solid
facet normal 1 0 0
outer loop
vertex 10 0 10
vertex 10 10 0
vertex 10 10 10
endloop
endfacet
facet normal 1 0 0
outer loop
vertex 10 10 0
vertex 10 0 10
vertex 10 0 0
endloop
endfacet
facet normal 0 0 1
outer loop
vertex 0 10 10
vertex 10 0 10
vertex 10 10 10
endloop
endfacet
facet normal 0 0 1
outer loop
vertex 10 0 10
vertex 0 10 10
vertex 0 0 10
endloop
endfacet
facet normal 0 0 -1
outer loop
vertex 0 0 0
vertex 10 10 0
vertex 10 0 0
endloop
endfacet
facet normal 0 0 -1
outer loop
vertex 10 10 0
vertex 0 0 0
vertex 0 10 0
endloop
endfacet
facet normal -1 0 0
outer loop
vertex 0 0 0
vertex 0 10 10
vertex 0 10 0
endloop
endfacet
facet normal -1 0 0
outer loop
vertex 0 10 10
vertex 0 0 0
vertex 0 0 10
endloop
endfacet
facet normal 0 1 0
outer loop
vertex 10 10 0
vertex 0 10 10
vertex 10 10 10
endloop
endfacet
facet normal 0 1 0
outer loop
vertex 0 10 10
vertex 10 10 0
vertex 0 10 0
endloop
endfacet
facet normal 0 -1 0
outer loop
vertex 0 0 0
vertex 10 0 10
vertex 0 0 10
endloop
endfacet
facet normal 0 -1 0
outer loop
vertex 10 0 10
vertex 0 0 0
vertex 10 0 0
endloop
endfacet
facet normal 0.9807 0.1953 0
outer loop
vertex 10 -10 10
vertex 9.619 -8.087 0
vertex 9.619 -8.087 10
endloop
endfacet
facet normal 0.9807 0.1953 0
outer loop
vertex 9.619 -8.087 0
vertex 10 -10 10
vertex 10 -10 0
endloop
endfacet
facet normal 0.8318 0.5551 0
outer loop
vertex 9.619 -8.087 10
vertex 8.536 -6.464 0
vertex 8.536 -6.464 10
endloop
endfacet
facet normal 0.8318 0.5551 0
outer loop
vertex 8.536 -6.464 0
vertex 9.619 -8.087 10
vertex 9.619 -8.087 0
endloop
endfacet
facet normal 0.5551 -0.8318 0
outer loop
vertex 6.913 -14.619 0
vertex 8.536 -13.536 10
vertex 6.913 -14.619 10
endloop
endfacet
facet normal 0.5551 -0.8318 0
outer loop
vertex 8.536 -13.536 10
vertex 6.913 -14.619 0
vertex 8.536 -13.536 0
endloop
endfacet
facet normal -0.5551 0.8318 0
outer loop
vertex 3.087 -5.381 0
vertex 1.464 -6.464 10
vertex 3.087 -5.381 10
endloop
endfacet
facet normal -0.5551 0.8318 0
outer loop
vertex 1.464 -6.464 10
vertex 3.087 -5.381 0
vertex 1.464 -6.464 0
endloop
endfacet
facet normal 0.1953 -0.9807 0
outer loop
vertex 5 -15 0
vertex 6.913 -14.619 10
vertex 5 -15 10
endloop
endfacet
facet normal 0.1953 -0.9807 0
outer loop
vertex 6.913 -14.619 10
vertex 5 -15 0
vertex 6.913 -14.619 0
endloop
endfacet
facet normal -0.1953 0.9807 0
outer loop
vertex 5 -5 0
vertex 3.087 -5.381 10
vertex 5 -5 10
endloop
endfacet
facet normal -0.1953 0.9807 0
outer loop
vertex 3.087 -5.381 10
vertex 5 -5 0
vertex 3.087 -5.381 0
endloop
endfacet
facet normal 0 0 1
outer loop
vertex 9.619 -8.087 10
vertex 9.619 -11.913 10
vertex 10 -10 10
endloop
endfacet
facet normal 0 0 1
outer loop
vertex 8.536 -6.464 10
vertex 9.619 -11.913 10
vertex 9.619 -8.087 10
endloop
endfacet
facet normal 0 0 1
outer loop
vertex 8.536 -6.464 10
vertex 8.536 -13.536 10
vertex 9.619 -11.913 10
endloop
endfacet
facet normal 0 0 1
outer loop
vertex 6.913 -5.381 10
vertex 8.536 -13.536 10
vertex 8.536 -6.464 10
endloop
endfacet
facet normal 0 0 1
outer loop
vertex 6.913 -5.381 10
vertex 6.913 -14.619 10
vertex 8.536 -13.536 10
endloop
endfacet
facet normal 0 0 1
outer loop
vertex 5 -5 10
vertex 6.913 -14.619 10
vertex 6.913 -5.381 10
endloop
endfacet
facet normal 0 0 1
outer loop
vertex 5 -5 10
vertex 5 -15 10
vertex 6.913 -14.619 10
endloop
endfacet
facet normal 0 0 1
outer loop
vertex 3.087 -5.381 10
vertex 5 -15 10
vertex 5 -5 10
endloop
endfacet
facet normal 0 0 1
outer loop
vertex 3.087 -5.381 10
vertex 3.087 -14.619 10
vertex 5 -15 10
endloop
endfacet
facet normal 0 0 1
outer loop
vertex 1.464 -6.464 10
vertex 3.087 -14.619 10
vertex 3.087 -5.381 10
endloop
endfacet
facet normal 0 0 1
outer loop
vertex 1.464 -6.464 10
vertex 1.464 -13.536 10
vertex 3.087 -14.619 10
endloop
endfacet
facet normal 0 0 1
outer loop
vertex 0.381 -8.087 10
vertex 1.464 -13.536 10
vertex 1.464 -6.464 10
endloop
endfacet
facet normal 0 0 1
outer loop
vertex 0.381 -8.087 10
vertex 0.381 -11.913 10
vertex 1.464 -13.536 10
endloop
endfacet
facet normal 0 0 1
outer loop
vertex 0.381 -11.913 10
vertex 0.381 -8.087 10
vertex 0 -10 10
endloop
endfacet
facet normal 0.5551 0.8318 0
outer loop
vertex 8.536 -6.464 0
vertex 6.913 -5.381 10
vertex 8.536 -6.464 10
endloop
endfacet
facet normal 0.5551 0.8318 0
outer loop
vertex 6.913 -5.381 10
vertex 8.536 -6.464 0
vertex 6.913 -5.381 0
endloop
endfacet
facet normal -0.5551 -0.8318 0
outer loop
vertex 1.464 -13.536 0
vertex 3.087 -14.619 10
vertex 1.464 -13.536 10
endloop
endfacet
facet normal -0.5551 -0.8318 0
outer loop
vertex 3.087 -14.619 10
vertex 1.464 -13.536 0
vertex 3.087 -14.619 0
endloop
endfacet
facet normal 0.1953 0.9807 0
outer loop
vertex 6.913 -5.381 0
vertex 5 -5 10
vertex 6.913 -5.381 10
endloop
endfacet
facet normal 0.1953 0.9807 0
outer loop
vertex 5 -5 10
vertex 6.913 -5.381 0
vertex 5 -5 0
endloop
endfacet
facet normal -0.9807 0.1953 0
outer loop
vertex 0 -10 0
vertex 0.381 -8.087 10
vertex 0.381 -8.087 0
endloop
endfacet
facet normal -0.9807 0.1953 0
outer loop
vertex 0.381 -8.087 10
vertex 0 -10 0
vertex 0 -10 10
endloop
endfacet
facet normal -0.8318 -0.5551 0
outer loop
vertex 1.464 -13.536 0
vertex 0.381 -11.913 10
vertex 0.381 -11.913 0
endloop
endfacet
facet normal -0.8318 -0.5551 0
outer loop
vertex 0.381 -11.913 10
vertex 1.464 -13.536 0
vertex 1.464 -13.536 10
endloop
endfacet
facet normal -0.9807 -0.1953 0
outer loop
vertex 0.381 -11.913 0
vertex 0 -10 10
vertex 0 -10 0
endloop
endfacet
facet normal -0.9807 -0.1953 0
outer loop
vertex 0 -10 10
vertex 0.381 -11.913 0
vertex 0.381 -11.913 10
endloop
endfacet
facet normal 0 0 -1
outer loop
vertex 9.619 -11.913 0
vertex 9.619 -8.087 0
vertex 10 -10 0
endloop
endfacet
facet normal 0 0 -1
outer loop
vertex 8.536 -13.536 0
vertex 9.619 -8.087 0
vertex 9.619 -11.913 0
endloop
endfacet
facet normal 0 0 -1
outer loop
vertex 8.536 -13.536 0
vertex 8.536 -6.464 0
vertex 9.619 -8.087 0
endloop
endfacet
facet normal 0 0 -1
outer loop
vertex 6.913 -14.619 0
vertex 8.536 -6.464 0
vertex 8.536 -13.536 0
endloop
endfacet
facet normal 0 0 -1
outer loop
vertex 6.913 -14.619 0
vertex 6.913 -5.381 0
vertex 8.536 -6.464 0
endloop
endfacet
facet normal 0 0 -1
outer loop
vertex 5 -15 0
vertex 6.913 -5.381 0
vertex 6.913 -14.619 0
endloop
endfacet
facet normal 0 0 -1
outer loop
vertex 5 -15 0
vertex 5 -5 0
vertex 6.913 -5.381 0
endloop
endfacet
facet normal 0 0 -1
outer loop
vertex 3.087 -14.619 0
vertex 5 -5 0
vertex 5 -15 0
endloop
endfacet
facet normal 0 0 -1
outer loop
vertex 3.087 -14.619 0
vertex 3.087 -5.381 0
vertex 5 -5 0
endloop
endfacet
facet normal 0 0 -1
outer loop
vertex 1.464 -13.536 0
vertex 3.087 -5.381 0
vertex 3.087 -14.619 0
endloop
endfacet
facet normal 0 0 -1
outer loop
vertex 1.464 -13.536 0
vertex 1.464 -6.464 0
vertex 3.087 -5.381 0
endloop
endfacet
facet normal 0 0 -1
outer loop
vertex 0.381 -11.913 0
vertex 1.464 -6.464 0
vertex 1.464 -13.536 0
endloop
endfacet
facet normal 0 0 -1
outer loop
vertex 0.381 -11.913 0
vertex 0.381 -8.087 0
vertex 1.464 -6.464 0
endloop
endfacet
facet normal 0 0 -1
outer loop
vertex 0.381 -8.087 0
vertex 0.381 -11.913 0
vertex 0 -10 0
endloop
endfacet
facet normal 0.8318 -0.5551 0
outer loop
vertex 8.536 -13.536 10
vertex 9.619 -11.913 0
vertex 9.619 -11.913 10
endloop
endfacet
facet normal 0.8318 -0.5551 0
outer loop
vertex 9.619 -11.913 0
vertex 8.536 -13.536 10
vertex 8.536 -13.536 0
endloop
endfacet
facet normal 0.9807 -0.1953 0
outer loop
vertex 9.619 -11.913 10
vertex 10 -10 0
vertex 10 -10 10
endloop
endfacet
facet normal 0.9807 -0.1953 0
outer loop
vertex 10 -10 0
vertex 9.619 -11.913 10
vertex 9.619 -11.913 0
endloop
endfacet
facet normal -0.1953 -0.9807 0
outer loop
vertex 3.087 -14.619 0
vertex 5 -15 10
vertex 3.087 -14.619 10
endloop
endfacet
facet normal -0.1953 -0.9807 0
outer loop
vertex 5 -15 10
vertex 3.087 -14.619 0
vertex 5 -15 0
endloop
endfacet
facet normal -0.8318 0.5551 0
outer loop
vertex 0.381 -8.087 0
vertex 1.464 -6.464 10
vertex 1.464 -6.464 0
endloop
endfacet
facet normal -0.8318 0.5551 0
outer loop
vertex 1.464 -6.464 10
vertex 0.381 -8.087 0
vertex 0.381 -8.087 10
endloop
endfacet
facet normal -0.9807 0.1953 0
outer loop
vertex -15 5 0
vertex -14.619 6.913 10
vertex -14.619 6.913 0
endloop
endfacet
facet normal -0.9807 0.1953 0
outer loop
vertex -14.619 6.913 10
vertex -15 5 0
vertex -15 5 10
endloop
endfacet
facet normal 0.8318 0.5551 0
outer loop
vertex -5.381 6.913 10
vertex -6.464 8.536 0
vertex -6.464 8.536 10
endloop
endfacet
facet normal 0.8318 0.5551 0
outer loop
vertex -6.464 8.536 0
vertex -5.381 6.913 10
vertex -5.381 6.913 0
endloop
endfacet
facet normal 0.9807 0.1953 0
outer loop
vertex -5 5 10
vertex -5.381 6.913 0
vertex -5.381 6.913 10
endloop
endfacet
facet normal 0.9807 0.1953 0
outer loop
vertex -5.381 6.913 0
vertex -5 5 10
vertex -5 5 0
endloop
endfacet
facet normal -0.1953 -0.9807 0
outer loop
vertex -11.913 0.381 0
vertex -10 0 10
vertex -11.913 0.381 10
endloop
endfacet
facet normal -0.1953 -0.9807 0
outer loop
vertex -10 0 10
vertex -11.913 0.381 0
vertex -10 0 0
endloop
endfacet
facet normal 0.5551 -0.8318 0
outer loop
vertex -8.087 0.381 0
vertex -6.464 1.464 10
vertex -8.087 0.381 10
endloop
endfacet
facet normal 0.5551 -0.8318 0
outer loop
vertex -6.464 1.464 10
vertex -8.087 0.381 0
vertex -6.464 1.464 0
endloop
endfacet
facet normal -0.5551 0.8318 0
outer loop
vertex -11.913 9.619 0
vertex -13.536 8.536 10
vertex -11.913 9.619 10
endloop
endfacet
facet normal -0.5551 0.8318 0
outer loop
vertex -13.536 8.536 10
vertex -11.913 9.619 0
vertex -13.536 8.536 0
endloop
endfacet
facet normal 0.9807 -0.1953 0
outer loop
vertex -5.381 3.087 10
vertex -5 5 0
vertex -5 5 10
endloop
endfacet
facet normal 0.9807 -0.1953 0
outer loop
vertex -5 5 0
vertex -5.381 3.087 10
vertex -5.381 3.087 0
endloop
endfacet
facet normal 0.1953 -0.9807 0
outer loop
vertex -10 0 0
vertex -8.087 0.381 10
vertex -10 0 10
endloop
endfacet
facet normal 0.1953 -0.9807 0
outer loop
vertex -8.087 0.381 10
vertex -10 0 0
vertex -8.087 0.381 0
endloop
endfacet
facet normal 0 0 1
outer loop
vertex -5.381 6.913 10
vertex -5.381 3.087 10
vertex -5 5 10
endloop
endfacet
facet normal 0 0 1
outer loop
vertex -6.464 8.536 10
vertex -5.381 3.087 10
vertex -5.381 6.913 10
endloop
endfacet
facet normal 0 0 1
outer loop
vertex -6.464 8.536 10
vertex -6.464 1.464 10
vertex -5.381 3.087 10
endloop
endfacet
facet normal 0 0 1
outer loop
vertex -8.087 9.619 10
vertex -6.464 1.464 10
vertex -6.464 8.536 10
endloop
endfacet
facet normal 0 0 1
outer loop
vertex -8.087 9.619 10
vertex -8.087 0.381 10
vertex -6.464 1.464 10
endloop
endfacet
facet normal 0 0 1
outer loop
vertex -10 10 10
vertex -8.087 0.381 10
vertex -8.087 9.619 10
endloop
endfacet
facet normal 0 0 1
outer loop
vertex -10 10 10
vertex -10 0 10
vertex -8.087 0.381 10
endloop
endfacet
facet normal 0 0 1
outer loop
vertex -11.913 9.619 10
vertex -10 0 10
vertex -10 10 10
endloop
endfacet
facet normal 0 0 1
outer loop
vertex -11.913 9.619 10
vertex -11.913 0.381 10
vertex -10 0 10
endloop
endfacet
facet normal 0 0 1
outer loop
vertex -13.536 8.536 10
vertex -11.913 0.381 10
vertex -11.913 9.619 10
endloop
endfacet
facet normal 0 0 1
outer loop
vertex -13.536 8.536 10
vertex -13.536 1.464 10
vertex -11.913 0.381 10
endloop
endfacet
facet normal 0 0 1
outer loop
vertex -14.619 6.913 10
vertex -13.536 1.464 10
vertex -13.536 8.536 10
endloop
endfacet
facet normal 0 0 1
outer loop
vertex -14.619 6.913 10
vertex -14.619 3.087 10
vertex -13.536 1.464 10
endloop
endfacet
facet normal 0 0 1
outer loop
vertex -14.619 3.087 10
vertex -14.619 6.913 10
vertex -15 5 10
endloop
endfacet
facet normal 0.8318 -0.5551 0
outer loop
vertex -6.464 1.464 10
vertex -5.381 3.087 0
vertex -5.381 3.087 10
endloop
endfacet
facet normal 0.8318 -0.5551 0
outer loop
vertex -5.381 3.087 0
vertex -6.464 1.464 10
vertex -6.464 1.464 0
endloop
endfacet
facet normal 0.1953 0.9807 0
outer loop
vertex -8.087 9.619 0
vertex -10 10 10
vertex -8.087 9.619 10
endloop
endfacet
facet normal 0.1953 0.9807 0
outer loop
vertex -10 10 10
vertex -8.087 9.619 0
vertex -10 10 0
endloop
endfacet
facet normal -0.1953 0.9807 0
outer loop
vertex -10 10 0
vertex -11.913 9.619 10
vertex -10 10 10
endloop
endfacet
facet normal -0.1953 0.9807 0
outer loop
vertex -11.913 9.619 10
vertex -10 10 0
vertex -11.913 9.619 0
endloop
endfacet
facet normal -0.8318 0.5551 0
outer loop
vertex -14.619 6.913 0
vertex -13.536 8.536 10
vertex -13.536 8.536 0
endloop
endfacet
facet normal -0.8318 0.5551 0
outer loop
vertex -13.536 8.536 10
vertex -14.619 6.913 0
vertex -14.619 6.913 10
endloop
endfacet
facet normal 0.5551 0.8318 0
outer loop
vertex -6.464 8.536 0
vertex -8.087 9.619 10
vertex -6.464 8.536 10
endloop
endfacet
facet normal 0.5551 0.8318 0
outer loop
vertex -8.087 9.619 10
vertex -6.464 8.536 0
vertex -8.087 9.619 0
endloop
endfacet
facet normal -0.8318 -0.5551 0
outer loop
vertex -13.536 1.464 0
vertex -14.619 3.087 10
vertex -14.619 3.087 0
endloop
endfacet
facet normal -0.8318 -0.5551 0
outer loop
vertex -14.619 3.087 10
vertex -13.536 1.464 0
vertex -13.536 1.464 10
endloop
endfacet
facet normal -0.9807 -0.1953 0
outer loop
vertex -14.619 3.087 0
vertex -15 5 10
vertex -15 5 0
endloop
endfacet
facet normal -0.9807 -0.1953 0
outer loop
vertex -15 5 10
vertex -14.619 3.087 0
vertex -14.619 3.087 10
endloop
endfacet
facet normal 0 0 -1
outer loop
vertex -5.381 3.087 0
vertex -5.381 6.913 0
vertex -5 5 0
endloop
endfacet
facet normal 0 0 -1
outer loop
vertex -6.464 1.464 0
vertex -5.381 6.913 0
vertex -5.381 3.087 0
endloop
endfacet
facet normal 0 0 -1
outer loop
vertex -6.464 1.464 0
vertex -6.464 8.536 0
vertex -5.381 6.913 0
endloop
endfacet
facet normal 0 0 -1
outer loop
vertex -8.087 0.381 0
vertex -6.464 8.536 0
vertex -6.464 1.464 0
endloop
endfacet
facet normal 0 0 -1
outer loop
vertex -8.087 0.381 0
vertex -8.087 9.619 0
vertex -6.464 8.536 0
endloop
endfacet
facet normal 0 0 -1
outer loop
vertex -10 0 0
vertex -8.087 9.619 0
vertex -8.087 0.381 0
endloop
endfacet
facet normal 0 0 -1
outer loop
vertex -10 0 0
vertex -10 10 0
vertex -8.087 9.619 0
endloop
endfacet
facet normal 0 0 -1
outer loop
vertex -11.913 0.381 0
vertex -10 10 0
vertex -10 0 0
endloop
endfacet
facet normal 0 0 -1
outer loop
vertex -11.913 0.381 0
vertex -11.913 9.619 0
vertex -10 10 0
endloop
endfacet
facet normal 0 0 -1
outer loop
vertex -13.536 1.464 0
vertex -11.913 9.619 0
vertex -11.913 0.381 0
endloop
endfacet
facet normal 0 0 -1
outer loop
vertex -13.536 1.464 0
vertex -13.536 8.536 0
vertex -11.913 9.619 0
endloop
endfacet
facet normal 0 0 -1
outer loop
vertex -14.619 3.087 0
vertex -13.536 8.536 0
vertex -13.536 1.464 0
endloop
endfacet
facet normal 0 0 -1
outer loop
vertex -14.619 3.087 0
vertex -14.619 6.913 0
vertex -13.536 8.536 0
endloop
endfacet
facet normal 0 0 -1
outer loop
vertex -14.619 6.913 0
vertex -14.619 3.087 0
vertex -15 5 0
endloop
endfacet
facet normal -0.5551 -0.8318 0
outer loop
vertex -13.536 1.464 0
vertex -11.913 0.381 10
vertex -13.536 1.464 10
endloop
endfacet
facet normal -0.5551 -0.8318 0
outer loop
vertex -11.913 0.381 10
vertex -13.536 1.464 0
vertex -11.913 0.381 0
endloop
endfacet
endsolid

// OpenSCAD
// Heart Puzzle Instructions
// Use these pieces to make piece in the shape of a heart. 

cube([10,10,10]);

translate([5,-10,0]) 
cylinder(h=10,r1=5,r2=5);

translate([-10,5,0]) 
cylinder(h=10,r1=5,r2=5);
